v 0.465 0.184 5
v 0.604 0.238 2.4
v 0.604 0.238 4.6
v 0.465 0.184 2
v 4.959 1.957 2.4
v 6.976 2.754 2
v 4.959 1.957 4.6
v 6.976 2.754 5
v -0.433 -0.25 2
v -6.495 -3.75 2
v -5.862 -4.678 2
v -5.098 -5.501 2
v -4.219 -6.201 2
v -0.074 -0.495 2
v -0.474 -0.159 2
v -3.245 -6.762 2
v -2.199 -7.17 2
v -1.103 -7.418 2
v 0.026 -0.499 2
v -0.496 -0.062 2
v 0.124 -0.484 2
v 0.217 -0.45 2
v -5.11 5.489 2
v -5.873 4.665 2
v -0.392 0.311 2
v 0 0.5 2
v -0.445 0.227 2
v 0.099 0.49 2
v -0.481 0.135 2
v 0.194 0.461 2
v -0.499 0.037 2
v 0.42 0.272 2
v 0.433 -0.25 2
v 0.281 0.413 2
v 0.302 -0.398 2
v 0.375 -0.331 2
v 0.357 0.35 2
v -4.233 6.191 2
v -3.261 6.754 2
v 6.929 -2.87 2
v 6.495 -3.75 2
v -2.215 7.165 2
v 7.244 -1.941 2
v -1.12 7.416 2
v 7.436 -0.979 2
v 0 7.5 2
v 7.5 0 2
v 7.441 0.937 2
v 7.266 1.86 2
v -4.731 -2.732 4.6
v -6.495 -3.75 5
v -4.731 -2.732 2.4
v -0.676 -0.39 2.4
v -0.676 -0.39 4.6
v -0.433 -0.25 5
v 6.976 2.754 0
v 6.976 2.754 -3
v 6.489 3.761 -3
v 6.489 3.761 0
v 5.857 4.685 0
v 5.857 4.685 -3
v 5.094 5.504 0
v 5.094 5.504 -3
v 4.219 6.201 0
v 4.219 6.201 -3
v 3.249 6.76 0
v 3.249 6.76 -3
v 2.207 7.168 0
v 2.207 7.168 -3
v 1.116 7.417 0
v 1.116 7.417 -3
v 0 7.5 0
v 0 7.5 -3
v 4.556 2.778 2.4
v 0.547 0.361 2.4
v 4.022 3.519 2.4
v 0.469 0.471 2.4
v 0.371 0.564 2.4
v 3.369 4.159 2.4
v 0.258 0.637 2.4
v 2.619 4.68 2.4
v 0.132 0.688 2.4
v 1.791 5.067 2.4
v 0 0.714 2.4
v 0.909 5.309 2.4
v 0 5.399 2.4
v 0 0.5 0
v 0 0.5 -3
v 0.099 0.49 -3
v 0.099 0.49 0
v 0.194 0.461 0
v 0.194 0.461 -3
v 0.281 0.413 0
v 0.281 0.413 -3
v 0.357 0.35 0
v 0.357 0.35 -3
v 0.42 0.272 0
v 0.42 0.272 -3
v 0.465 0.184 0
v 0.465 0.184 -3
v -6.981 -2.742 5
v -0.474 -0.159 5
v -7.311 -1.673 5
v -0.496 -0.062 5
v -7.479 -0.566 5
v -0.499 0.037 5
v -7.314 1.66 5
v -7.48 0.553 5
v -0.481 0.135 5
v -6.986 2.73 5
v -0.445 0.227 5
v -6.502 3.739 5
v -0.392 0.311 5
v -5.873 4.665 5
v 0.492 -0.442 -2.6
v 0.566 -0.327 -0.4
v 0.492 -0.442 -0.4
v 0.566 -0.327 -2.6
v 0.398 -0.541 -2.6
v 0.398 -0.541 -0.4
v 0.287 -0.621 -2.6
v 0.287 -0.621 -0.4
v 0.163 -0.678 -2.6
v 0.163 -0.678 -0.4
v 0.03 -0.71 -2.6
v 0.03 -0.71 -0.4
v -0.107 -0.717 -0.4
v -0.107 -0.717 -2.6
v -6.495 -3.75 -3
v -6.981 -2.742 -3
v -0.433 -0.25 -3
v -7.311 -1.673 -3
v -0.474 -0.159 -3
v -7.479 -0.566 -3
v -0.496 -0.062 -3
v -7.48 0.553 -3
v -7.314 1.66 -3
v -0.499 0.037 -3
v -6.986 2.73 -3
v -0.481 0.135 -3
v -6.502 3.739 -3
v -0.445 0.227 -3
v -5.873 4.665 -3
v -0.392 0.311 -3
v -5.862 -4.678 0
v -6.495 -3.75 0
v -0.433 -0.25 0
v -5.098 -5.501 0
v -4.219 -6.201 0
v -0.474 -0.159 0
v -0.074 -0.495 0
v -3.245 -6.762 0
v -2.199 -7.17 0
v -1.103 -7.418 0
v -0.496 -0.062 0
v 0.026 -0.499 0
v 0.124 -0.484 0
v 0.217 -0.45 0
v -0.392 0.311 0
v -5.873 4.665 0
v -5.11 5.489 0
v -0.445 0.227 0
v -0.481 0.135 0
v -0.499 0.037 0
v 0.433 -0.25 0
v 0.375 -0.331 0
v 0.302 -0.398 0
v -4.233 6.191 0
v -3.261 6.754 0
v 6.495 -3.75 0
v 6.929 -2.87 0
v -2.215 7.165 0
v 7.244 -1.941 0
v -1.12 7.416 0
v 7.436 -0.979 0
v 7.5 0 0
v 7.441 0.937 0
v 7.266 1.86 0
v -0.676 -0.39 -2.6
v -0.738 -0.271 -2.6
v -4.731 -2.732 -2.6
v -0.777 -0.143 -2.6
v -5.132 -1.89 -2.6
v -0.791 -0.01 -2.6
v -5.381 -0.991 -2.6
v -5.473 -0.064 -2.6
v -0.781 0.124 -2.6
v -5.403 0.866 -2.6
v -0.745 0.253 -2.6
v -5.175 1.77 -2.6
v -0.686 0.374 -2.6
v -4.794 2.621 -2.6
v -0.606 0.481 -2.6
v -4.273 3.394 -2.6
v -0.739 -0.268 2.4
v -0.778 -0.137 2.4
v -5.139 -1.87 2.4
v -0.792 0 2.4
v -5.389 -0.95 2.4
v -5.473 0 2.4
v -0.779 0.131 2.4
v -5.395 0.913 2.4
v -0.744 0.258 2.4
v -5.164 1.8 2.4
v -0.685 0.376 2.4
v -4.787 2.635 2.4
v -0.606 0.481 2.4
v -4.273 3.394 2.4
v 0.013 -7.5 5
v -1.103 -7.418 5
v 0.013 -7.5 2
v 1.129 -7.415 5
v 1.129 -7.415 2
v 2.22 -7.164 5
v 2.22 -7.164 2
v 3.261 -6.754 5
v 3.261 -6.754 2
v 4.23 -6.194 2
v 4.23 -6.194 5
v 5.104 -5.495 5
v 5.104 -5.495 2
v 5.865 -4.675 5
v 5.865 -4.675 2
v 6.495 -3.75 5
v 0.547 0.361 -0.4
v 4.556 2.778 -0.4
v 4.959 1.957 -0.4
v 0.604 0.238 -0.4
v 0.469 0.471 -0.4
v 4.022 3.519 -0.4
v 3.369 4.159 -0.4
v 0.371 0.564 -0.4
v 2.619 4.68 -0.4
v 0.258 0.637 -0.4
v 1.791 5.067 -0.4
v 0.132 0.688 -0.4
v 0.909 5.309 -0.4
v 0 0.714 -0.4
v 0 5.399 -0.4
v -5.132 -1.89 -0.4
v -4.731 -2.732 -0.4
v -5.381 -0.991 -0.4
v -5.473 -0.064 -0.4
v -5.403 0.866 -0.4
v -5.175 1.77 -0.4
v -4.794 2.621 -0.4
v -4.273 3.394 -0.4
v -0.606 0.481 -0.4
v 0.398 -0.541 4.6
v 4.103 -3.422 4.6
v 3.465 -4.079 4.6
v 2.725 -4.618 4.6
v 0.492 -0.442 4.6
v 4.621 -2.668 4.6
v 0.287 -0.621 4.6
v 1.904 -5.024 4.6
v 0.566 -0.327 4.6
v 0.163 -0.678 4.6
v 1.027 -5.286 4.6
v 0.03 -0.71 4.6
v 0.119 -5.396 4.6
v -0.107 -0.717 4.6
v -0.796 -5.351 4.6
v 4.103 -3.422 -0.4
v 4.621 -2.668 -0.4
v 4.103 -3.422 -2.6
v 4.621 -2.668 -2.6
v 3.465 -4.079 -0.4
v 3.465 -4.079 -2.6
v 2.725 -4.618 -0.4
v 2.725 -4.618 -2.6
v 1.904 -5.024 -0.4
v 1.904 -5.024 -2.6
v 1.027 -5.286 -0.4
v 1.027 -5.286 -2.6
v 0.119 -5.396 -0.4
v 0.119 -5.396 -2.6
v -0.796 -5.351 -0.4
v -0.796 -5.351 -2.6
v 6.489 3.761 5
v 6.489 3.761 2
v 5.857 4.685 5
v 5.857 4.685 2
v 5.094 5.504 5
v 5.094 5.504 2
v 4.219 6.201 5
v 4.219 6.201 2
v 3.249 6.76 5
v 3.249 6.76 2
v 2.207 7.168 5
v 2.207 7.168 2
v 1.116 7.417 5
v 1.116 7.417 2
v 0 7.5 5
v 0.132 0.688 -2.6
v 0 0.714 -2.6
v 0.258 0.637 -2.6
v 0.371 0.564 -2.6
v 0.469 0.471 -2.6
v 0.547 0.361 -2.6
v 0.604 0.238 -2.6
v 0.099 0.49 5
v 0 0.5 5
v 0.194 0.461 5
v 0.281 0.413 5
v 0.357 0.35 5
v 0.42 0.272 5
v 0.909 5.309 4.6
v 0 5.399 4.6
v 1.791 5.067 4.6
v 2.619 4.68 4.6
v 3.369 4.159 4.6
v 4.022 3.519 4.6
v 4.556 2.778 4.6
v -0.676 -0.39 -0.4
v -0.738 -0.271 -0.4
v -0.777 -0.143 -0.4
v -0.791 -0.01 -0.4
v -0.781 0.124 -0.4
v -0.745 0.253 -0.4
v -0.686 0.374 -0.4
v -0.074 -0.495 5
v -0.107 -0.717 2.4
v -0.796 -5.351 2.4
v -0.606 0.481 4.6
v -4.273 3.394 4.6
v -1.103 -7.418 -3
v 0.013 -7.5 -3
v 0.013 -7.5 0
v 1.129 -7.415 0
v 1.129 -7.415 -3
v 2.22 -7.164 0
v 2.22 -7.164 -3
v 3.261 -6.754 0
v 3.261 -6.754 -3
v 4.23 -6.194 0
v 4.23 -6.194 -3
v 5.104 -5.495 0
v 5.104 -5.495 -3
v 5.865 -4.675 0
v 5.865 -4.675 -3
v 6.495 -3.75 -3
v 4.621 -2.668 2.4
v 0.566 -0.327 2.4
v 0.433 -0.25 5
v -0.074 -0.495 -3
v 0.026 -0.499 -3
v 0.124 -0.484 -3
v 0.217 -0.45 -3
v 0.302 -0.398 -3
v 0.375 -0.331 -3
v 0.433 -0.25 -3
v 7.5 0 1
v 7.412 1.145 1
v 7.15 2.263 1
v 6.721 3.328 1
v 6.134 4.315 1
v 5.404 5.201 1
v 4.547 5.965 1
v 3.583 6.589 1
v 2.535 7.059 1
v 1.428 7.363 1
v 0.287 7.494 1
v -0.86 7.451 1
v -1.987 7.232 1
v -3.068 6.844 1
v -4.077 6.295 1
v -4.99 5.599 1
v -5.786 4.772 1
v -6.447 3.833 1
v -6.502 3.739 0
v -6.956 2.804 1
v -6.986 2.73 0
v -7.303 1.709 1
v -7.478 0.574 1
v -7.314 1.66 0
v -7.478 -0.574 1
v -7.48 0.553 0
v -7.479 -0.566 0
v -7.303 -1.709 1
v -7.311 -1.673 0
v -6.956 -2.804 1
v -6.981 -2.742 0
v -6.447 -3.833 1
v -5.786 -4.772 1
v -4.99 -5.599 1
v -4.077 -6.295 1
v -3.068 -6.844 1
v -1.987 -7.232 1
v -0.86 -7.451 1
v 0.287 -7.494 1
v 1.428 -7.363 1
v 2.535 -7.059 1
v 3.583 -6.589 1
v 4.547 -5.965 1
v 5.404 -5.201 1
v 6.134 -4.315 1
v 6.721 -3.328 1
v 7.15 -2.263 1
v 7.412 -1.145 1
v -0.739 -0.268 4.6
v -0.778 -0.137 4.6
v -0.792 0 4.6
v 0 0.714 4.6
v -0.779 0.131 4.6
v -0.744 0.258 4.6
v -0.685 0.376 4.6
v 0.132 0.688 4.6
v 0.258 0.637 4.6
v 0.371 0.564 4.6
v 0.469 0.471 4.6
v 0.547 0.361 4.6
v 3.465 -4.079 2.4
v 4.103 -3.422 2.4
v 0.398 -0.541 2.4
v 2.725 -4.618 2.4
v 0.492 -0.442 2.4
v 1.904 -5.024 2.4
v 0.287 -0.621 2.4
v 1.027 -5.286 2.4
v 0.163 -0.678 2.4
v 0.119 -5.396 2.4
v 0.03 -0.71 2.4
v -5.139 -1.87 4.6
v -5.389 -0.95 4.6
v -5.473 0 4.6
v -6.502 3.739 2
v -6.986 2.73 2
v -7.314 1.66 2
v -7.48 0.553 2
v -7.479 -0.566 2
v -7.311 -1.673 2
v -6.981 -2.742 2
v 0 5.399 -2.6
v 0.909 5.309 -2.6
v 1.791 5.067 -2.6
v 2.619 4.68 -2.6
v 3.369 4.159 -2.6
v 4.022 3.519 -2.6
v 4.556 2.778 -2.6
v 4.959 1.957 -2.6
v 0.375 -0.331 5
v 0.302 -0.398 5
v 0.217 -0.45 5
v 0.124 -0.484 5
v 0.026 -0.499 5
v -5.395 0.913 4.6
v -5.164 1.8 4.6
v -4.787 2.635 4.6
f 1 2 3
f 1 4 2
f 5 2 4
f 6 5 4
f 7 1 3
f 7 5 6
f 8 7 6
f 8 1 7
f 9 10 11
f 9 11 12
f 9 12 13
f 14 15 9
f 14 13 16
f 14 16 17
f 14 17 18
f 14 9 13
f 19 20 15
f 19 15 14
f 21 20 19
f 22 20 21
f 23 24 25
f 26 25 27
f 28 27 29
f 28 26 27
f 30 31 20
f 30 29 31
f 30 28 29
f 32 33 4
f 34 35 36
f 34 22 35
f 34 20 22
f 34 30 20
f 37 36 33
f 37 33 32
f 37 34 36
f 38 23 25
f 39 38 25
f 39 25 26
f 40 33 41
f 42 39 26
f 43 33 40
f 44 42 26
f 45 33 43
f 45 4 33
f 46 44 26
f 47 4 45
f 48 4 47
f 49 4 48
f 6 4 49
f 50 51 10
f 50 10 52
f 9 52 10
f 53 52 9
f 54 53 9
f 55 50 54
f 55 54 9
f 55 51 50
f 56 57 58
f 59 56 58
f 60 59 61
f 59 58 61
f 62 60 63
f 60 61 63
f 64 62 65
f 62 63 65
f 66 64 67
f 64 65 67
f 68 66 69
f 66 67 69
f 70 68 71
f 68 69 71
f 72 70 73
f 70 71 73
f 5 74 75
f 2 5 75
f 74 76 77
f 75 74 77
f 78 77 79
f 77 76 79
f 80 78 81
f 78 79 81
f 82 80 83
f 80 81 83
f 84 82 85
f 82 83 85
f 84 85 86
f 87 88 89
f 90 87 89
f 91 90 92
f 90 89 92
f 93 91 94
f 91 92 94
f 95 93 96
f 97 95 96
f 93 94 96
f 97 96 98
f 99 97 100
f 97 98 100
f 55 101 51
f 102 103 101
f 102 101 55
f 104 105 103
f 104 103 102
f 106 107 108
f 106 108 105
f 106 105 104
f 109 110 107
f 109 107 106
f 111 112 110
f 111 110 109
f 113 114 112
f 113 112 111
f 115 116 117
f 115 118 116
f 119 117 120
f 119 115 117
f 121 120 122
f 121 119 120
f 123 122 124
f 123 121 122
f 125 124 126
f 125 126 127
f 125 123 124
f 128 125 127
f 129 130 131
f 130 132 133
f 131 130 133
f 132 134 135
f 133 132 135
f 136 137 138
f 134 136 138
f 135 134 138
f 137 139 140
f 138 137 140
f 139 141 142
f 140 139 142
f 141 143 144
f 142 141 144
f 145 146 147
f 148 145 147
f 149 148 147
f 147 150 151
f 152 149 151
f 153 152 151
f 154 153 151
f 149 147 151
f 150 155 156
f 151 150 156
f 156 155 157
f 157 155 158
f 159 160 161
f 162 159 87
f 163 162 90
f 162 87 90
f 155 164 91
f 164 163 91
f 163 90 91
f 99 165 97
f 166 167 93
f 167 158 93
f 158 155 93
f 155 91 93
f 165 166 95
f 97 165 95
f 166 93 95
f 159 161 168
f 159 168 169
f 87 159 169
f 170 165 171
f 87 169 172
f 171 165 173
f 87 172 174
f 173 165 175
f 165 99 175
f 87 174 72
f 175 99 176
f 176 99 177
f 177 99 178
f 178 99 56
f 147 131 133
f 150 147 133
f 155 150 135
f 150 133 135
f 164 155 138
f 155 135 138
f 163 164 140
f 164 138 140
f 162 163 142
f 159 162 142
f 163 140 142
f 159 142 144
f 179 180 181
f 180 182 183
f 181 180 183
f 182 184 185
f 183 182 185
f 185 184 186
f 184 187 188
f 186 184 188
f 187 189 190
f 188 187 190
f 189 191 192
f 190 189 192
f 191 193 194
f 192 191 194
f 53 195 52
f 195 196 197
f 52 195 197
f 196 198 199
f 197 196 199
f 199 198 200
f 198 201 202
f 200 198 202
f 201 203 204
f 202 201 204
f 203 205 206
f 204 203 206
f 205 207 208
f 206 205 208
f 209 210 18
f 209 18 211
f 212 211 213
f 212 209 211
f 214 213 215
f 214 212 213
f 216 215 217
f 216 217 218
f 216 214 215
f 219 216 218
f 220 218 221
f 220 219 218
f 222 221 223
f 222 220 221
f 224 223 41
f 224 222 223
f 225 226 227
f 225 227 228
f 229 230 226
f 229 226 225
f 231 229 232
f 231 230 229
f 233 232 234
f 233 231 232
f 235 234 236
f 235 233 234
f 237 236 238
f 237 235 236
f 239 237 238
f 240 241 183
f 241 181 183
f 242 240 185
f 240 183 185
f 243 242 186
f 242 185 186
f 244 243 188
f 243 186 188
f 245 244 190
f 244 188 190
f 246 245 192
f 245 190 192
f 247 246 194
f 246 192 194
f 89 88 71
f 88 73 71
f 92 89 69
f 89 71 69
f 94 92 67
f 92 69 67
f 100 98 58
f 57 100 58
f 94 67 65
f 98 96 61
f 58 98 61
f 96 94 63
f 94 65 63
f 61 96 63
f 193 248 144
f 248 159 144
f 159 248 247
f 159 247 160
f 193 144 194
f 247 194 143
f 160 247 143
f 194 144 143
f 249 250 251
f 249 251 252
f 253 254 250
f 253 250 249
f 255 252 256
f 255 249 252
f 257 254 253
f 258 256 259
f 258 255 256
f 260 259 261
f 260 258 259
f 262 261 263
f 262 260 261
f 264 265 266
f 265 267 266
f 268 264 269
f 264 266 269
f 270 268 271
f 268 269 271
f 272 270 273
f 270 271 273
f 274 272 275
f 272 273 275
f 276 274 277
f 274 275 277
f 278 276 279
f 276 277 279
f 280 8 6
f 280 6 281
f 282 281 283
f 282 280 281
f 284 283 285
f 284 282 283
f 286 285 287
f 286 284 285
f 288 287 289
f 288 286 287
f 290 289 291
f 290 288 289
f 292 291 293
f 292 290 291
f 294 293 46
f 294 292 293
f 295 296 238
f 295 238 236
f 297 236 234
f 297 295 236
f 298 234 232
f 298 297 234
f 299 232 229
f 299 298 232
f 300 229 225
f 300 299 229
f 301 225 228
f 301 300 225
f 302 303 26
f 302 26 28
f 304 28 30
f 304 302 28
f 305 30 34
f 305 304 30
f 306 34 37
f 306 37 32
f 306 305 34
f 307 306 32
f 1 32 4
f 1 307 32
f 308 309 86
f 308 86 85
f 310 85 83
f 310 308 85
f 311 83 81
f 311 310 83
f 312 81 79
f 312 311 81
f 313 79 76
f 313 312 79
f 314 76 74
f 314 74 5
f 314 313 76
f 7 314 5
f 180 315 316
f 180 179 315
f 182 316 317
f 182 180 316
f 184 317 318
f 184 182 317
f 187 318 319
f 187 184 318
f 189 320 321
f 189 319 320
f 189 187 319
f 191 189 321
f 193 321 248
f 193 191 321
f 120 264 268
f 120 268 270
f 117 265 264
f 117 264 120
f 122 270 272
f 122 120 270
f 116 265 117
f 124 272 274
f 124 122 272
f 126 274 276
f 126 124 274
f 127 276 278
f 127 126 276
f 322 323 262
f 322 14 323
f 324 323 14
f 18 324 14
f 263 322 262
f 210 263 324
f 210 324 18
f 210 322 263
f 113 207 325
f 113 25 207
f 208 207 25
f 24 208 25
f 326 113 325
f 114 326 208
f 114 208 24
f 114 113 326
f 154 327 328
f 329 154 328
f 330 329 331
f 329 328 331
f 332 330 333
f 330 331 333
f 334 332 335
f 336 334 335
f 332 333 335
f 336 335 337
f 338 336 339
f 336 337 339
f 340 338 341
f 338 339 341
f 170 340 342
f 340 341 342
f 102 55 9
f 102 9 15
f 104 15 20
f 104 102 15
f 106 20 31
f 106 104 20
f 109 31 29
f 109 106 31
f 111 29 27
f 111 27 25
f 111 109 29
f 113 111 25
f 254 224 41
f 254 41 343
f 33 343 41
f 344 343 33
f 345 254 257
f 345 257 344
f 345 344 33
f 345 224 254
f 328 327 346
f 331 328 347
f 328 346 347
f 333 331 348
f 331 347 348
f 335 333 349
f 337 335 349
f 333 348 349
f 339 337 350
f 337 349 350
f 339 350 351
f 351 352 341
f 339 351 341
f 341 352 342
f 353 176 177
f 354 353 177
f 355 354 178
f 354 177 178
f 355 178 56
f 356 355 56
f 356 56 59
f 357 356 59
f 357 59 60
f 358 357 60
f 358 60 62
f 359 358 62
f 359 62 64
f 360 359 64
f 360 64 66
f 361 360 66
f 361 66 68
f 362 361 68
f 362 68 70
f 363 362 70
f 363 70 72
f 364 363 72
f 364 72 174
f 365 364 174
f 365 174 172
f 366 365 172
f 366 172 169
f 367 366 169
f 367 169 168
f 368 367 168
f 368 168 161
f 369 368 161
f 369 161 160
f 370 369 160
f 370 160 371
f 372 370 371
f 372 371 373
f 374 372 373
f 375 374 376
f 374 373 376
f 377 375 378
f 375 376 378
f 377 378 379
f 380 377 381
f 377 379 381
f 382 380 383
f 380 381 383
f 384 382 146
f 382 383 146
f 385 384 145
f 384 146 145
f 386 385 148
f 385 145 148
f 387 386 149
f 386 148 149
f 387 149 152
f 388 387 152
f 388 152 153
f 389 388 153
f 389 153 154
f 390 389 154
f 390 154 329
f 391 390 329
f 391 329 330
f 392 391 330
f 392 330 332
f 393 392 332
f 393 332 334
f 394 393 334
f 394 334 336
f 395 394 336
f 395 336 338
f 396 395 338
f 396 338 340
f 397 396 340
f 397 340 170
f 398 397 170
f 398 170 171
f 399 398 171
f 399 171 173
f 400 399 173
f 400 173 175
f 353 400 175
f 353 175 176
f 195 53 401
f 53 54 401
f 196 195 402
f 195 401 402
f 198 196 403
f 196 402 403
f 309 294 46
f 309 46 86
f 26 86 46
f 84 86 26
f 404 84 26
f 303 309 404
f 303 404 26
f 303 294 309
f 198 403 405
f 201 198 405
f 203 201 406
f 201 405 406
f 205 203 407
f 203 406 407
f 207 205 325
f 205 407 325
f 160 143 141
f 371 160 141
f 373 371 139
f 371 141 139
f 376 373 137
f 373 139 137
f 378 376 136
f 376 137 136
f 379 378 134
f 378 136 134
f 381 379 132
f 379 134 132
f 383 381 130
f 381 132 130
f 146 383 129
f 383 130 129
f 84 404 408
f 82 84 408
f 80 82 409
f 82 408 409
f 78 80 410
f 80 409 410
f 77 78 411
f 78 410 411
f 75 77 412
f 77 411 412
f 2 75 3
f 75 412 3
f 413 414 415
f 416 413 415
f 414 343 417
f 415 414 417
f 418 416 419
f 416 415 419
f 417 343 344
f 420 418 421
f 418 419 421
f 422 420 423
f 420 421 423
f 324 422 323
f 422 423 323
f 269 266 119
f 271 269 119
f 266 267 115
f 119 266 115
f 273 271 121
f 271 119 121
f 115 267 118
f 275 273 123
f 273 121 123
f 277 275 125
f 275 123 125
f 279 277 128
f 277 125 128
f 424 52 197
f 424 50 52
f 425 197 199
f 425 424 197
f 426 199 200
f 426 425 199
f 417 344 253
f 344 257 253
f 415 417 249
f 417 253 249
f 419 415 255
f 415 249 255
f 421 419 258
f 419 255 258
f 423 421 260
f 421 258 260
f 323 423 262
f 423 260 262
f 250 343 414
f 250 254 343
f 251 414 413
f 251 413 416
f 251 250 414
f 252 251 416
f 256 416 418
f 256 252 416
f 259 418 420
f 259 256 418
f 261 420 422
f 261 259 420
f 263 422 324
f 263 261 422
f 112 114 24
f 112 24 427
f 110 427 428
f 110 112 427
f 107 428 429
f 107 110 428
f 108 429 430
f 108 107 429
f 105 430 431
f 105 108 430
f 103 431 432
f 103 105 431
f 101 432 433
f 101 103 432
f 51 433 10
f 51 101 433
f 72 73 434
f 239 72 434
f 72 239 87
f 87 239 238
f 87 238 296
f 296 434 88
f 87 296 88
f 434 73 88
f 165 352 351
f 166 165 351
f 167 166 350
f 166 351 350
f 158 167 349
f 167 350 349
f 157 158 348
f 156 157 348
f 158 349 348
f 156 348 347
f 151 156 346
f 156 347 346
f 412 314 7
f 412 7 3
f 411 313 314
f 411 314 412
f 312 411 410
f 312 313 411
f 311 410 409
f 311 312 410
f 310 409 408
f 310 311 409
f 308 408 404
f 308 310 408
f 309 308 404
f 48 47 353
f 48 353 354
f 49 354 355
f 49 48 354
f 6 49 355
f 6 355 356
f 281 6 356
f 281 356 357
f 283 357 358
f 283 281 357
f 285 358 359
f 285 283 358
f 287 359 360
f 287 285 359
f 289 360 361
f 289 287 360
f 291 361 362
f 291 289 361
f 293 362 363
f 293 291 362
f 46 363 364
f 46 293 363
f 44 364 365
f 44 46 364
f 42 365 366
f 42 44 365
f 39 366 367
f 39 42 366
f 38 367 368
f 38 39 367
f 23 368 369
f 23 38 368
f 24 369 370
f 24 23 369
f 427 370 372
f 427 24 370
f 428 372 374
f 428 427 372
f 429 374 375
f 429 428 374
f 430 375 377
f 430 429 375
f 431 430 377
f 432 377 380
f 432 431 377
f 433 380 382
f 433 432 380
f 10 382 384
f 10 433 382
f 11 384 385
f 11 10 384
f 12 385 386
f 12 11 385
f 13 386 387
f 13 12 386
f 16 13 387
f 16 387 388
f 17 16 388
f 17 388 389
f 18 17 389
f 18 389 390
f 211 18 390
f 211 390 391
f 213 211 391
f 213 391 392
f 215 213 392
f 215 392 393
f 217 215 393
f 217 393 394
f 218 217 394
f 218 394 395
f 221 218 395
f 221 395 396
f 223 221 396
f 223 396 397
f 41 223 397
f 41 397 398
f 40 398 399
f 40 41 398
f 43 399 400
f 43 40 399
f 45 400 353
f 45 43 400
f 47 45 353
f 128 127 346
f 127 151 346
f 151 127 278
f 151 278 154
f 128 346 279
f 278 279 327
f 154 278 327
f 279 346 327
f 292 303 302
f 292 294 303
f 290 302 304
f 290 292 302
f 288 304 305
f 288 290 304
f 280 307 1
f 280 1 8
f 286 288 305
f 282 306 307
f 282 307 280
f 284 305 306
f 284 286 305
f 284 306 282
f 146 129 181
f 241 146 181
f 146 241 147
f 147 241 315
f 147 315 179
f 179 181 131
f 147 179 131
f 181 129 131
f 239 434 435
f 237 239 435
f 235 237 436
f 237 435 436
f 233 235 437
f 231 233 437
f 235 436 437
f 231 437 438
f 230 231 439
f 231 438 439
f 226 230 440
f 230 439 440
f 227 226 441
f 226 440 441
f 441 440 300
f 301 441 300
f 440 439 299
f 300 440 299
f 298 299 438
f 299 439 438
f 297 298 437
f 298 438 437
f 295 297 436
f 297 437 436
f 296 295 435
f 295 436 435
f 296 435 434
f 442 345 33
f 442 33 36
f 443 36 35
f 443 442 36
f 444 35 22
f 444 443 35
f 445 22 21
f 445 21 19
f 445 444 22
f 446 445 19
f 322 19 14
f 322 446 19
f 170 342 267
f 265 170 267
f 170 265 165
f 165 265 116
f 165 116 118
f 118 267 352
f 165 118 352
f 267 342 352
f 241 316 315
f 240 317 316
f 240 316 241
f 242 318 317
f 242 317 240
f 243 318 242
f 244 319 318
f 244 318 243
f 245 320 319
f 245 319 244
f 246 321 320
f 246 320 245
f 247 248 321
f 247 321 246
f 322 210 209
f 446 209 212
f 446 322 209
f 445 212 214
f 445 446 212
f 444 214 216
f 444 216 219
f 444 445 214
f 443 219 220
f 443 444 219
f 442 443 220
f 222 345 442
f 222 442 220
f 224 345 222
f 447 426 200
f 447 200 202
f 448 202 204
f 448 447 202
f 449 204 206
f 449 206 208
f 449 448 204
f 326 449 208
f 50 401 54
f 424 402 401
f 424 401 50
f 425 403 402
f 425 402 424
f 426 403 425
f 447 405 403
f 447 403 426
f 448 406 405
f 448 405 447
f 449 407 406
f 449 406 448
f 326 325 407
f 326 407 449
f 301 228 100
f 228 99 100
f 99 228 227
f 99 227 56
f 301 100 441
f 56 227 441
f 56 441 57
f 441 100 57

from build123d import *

# Parameters (mm, degrees)
ESQUISSE1_R        = 7.5
BOSS_EXTRU_1_DEPTH = 1
EXTRU_MINCE1_START = -3
EXTRU_MINCE1_DEPTH = 3
ESQUISSE2_W        = 4.681470229
ESQUISSE2_H        = 2.2


with BuildPart() as part:
    # Esquisse1 → Boss.-Extru.1 (new body)
    with BuildSketch(Plane.XY):
        Circle(ESQUISSE1_R)
    boss_extru_1 = extrude(amount=BOSS_EXTRU_1_DEPTH)

    # Esquisse1<3> → Extru.-Mince1 (add)
    with BuildSketch(Plane.XY.offset(EXTRU_MINCE1_START)):
        with BuildLine():
            ThreePointArc((0, 0.5), (0.28125, 0.413398642), (0.465073473, 0.18359375))
            Line((0.465073473, 0.18359375), (6.97610209, 2.75390625))
            ThreePointArc((6.97610209, 2.75390625), (4.21875, 6.200979635), (0, 7.5))
            Line((0, 7.5), (0, 0.5))
        make_face()
        with BuildLine():
            ThreePointArc((0.433012702, -0.25), (0.217388726, -0.450268966), (-0.073539885, -0.494562317))
            Line((-0.073539885, -0.494562317), (-1.103098273, -7.418434754))
            ThreePointArc((-1.103098273, -7.418434754), (3.260830893, -6.75403449), (6.495190528, -3.75))
            Line((6.495190528, -3.75), (0.433012702, -0.25))
        make_face()
        with BuildLine():
            ThreePointArc((-0.433012702, -0.25), (-0.498638726, 0.036870324), (-0.391533588, 0.310968567))
            Line((-0.391533588, 0.310968567), (-5.873003817, 4.664528504))
            ThreePointArc((-5.873003817, 4.664528504), (-7.479580893, 0.553054855), (-6.495190528, -3.75))
            Line((-6.495190528, -3.75), (-0.433012702, -0.25))
        make_face()
    extru_mince1 = extrude(amount=EXTRU_MINCE1_DEPTH)

    # Esquisse2 → Enlèvement de matière-Révolution1 (revolve, cut)
    with BuildSketch(Plane(origin=(0, 0, 0), x_dir=(1, 0, 0), z_dir=(0, 1, 0))):
        with Locations((-3.132268703, 1.5)):
            Rectangle(ESQUISSE2_W, ESQUISSE2_H)
    enl_vement_de_mati_re_r_volution1 = revolve(axis=Axis((-0.073539885, 0, -0.058266309), (0, 0, -1)), mode=Mode.SUBTRACT)

    # Symétrie1: Boss.-Extru.1, Extru.-Mince1, Enlèvement de matière-Révolution1 across plane
    add(boss_extru_1.mirror(Plane.XY.offset(1)))
    add(extru_mince1.mirror(Plane.XY.offset(1)))
    add(enl_vement_de_mati_re_r_volution1.mirror(Plane.XY.offset(1)), mode=Mode.SUBTRACT)


solid = part.part
